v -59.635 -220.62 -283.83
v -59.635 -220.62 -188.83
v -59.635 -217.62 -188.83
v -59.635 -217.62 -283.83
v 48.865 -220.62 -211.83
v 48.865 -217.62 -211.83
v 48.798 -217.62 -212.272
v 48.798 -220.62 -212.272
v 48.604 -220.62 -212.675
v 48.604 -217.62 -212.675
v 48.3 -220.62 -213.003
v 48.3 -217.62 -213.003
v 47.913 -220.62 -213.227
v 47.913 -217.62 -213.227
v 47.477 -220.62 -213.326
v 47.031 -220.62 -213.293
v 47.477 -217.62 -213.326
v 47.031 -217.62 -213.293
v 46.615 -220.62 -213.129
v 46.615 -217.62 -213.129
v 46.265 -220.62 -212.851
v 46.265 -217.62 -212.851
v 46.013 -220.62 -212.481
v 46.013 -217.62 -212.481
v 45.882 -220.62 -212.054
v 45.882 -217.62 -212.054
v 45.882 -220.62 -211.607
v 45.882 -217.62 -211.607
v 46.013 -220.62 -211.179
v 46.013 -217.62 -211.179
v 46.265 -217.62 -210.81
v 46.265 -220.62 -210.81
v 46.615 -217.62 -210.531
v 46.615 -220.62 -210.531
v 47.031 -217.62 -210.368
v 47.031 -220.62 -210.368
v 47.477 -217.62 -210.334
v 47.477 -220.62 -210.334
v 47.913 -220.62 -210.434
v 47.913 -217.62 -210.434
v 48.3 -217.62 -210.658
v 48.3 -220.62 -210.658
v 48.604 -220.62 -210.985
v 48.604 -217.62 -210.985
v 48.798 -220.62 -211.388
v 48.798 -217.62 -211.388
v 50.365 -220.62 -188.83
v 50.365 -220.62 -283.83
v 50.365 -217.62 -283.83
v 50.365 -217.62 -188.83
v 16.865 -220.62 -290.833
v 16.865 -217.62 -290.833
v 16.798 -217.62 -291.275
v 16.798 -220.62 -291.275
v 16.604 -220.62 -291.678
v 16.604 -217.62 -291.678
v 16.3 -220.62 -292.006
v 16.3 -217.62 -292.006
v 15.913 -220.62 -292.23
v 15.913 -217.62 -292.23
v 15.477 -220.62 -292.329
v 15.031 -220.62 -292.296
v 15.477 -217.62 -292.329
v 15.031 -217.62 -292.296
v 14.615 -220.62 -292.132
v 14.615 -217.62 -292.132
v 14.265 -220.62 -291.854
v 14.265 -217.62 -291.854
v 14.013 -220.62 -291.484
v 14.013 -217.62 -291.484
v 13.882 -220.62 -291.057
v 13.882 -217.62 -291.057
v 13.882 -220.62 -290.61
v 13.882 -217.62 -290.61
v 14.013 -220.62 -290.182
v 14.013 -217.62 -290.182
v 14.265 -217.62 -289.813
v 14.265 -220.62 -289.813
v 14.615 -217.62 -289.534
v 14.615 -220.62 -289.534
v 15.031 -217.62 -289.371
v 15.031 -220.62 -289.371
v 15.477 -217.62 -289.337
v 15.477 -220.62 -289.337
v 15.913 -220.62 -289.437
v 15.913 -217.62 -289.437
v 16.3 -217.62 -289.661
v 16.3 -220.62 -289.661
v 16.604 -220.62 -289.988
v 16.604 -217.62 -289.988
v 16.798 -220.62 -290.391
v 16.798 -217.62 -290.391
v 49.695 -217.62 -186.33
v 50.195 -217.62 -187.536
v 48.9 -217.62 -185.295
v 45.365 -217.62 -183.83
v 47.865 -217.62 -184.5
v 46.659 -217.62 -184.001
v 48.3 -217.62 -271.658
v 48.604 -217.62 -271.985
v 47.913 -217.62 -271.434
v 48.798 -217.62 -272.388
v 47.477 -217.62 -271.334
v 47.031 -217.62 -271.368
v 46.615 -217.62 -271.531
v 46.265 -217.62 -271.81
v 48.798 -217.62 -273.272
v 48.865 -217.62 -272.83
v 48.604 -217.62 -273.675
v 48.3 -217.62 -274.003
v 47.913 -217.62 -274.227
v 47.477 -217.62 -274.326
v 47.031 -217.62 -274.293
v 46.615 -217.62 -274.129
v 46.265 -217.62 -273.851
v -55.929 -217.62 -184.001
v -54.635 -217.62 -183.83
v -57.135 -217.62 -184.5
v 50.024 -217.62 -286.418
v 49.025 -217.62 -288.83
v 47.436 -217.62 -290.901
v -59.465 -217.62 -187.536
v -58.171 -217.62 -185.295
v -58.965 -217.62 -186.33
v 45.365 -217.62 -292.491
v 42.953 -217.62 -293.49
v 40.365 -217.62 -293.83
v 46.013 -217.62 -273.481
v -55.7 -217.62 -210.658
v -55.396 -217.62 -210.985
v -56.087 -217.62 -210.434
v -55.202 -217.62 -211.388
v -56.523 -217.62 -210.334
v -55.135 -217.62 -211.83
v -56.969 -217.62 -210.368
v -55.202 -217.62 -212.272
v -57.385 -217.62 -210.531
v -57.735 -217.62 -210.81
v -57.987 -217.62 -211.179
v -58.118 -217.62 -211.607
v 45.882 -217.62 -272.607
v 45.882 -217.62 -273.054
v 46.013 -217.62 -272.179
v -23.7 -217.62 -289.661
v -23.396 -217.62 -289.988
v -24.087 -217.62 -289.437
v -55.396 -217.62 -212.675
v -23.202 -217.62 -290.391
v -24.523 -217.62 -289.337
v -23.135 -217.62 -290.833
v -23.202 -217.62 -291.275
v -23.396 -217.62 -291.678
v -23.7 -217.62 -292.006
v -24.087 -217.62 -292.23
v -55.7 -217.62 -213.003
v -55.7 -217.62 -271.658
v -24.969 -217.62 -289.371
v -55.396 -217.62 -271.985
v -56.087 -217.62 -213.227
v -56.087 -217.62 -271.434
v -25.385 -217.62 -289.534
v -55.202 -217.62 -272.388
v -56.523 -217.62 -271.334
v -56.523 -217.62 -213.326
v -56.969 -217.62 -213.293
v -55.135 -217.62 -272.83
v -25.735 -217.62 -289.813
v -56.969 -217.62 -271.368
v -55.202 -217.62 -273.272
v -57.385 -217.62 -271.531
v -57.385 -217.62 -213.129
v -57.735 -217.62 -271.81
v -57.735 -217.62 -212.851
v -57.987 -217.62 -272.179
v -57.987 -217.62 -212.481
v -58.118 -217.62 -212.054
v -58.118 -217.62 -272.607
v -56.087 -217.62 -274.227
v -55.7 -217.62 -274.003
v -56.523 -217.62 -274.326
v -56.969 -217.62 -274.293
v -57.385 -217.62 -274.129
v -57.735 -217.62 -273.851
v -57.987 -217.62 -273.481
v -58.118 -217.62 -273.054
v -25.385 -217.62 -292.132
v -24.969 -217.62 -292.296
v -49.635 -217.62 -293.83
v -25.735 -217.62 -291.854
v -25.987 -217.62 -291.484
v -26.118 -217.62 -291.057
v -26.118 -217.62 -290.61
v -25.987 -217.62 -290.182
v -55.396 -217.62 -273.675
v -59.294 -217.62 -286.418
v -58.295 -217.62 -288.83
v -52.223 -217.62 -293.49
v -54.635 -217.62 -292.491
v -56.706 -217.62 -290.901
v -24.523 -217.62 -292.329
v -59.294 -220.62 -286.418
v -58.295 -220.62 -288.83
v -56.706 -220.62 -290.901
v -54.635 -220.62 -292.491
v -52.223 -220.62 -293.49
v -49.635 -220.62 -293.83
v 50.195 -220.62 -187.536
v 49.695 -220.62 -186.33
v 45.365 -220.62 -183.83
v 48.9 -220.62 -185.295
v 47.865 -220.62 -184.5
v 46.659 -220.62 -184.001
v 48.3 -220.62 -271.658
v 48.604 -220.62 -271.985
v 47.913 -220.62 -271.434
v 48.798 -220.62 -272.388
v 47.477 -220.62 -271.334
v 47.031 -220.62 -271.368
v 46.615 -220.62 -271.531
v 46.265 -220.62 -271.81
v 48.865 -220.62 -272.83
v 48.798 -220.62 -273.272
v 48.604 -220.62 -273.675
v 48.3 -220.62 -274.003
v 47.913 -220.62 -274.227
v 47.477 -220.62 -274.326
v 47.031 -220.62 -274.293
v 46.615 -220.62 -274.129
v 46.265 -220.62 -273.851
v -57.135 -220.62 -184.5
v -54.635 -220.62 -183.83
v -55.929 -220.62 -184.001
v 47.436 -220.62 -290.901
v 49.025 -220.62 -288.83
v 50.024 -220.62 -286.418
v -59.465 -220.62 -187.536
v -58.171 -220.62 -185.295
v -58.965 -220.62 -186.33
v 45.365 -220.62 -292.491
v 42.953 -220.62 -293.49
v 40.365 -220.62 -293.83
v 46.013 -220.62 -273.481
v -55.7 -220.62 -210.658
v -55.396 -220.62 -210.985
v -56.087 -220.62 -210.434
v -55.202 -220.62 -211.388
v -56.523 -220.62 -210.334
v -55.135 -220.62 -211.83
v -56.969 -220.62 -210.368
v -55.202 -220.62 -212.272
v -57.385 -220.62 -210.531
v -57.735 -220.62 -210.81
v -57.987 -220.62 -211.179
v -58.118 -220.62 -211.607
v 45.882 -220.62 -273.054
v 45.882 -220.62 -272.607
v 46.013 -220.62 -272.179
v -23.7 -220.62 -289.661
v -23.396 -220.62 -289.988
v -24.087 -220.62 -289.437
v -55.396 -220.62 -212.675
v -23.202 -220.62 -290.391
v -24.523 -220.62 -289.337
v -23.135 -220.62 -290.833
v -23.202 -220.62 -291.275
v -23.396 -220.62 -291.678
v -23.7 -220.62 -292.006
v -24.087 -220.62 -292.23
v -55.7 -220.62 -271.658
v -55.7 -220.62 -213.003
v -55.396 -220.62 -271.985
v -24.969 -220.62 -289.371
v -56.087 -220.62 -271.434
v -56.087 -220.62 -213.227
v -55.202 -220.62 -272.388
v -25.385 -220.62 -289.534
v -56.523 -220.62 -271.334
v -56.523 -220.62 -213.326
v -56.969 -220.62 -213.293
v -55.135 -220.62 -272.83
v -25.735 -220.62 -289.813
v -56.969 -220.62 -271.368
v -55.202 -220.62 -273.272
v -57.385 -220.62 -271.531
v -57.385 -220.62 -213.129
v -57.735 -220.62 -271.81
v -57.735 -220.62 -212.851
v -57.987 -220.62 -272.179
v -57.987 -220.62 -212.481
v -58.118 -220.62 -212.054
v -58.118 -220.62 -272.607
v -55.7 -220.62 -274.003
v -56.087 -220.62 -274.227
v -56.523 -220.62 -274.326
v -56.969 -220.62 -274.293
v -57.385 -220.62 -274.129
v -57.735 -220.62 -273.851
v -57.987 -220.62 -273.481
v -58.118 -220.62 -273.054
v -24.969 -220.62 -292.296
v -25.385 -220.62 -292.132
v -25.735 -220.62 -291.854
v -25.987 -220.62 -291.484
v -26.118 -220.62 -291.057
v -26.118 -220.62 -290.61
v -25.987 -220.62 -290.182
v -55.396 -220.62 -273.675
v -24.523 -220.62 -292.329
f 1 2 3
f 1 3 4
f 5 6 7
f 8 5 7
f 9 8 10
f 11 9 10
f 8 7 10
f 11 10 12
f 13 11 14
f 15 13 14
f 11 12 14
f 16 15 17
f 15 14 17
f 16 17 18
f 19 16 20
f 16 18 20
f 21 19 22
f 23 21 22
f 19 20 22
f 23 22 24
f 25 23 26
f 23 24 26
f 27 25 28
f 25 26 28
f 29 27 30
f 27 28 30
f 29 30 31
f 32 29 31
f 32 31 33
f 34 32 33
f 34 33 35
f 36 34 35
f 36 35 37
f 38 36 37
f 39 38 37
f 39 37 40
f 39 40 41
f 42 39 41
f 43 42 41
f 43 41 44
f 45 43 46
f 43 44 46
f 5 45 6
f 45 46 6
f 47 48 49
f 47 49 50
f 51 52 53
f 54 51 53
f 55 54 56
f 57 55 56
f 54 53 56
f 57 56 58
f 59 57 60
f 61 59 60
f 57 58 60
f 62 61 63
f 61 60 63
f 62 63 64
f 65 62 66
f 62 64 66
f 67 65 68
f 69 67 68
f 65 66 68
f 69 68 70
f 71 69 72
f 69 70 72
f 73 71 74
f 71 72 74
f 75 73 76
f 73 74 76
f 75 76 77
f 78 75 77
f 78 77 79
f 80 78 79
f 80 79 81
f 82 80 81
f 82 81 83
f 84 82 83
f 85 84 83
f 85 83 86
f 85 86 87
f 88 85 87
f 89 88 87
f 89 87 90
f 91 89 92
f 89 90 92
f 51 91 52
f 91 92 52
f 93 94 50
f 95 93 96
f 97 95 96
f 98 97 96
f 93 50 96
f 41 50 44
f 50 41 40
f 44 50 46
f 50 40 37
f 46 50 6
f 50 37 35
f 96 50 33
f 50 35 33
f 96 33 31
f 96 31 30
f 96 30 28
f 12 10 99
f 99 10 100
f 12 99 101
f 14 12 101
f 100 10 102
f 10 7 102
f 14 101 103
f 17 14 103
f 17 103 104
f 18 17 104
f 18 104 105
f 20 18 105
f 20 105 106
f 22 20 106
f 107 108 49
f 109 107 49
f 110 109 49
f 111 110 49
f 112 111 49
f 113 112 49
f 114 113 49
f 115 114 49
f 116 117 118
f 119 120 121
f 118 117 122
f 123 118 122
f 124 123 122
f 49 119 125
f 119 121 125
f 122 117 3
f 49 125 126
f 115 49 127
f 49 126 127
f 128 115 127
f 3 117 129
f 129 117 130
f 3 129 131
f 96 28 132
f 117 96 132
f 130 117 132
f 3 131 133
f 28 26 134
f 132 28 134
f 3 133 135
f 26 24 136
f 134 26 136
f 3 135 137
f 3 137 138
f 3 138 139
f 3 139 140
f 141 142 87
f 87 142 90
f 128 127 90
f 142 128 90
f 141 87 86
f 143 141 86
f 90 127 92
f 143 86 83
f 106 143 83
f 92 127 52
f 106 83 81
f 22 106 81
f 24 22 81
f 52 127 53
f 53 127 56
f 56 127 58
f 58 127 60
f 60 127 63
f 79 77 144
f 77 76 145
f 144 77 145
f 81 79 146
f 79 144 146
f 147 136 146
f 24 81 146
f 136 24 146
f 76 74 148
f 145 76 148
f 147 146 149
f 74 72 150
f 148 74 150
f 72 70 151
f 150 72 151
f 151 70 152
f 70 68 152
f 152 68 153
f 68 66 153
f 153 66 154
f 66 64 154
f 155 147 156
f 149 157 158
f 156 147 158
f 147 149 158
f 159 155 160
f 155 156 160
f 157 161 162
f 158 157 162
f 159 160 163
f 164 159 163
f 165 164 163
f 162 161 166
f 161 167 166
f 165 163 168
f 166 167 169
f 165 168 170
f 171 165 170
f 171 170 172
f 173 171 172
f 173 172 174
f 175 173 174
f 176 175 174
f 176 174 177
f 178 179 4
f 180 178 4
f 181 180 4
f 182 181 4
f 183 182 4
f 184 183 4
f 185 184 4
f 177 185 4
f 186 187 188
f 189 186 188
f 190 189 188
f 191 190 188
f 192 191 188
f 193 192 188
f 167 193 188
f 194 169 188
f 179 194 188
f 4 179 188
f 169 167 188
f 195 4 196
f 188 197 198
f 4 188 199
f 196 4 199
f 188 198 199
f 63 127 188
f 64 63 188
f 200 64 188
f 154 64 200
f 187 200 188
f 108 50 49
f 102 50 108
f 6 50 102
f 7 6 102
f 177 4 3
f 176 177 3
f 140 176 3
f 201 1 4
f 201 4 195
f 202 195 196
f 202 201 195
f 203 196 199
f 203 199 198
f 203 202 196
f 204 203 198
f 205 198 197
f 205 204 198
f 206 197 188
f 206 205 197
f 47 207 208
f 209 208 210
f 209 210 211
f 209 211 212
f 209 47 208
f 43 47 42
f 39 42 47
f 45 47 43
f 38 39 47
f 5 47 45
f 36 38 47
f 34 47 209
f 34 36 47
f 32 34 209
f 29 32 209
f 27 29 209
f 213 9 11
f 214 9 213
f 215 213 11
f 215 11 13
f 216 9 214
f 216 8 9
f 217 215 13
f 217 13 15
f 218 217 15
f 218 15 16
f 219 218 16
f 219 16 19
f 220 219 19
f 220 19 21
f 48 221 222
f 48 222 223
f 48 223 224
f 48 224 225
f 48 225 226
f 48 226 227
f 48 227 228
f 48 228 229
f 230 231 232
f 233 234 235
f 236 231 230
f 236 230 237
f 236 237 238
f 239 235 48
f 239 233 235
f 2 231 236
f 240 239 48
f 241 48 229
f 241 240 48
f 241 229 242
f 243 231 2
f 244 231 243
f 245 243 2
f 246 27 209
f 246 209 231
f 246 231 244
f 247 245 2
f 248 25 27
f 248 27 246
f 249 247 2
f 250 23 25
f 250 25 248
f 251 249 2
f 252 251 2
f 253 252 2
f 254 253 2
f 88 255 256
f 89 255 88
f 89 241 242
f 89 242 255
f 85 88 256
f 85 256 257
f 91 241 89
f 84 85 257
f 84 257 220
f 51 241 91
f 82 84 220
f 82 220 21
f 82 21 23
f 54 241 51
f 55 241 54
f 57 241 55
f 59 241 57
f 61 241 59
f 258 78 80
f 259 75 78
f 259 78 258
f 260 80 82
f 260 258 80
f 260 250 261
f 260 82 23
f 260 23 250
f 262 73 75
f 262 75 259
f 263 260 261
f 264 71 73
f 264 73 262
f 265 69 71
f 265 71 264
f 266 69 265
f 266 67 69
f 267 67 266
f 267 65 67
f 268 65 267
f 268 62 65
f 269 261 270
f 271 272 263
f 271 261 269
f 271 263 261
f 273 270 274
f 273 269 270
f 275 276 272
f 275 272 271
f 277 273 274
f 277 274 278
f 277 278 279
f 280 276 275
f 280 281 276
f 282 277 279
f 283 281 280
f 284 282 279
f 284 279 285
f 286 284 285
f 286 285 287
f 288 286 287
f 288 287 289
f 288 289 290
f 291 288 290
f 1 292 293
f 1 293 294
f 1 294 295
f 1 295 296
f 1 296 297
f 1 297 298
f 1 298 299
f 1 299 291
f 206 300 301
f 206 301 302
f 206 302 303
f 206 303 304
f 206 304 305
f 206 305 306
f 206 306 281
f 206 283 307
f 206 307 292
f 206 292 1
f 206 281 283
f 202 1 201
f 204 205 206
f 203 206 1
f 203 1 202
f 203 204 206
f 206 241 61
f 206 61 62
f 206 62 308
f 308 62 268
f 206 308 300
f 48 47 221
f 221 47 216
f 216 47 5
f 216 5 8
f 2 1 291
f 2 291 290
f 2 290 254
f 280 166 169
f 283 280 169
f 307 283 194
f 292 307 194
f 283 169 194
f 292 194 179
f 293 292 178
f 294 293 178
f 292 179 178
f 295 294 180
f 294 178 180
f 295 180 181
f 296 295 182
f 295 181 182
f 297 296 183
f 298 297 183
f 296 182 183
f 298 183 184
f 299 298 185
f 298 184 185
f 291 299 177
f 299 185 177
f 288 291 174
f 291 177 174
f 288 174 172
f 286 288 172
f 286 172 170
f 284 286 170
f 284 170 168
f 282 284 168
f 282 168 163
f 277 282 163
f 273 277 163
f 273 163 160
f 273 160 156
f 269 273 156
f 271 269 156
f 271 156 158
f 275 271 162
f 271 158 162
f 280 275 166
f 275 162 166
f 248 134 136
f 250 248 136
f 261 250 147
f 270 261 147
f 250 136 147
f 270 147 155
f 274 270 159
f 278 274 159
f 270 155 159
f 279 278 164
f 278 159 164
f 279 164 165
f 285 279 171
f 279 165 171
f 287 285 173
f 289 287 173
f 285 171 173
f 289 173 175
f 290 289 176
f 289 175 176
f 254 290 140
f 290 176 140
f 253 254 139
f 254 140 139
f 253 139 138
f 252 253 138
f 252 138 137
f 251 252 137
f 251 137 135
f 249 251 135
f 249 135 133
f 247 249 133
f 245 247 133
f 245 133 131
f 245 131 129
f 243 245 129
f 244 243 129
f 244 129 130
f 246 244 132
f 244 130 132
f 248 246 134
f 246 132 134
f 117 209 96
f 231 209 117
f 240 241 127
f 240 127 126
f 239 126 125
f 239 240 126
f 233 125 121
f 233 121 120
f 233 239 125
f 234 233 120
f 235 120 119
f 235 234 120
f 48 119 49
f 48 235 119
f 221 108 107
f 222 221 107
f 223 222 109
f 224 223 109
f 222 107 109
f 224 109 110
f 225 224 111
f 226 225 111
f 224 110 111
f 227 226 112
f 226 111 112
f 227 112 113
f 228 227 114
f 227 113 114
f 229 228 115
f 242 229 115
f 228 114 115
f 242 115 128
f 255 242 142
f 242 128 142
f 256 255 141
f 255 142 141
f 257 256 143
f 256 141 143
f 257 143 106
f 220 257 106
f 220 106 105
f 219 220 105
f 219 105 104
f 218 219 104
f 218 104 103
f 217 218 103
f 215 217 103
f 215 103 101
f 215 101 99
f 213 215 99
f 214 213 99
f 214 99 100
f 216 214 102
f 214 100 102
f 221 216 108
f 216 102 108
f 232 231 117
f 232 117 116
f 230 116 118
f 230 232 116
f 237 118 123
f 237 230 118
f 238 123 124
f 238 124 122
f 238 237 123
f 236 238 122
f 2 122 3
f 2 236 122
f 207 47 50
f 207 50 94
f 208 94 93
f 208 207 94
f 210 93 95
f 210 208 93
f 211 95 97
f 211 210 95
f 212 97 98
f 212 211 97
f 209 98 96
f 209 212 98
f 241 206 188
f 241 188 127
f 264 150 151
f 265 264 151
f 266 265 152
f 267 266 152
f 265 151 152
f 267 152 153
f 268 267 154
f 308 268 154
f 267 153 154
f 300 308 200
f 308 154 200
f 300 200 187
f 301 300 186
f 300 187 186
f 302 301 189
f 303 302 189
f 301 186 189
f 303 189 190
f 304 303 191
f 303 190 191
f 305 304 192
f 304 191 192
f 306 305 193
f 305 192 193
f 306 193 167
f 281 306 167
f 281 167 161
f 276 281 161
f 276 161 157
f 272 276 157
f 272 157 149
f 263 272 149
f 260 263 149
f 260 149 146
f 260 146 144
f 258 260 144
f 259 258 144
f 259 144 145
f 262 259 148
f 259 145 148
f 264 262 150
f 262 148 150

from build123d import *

# Parameters (mm, degrees)
BOSS_EXTRUDE1_DEPTH = 3
SKETCH2_R           = 1.5
CUT_EXTRUDE1_DEPTH  = 3


with BuildPart() as part:
    # Sketch1 → Boss-Extrude1 (new body)
    with BuildSketch(Plane(origin=(0, -220.619565514, 0), x_dir=(1, 0, 0), z_dir=(0, 1, 0))):
        with BuildLine():
            Line((-49.635107582, 293.830274817), (40.364892418, 293.830274817))
            ThreePointArc((40.364892418, 293.830274817), (47.435960229, 290.901342629), (50.364892418, 283.830274817))
            Line((50.364892418, 283.830274817), (50.364892418, 188.830274817))
            ThreePointArc((50.364892418, 188.830274817), (48.900426323, 185.294740911), (45.364892418, 183.830274817))
            Line((45.364892418, 183.830274817), (-54.635107582, 183.830274817))
            ThreePointArc((-54.635107582, 183.830274817), (-58.170641488, 185.294740911), (-59.635107582, 188.830274817))
            Line((-59.635107582, 188.830274817), (-59.635107582, 283.830274817))
            ThreePointArc((-59.635107582, 283.830274817), (-56.706175394, 290.901342629), (-49.635107582, 293.830274817))
        make_face()
    extrude(amount=BOSS_EXTRUDE1_DEPTH)

    # Sketch2 → Cut-Extrude1 (cut)
    with BuildSketch(Plane(origin=(0, -217.619565514, 0), x_dir=(1, 0, 0), z_dir=(0, 1, 0))):
        with Locations((-24.635107582, 290.833255232)):
            Circle(SKETCH2_R)
        with Locations((15.364892418, 290.833255232)):
            Circle(SKETCH2_R)
        with Locations((47.364892418, 272.830274817)):
            Circle(SKETCH2_R)
        with Locations((47.364892418, 211.830274817)):
            Circle(SKETCH2_R)
        with Locations((-56.635107582, 211.830274817)):
            Circle(SKETCH2_R)
        with Locations((-56.635107582, 272.830274817)):
            Circle(SKETCH2_R)
    extrude(amount=-CUT_EXTRUDE1_DEPTH, mode=Mode.SUBTRACT)


solid = part.part
